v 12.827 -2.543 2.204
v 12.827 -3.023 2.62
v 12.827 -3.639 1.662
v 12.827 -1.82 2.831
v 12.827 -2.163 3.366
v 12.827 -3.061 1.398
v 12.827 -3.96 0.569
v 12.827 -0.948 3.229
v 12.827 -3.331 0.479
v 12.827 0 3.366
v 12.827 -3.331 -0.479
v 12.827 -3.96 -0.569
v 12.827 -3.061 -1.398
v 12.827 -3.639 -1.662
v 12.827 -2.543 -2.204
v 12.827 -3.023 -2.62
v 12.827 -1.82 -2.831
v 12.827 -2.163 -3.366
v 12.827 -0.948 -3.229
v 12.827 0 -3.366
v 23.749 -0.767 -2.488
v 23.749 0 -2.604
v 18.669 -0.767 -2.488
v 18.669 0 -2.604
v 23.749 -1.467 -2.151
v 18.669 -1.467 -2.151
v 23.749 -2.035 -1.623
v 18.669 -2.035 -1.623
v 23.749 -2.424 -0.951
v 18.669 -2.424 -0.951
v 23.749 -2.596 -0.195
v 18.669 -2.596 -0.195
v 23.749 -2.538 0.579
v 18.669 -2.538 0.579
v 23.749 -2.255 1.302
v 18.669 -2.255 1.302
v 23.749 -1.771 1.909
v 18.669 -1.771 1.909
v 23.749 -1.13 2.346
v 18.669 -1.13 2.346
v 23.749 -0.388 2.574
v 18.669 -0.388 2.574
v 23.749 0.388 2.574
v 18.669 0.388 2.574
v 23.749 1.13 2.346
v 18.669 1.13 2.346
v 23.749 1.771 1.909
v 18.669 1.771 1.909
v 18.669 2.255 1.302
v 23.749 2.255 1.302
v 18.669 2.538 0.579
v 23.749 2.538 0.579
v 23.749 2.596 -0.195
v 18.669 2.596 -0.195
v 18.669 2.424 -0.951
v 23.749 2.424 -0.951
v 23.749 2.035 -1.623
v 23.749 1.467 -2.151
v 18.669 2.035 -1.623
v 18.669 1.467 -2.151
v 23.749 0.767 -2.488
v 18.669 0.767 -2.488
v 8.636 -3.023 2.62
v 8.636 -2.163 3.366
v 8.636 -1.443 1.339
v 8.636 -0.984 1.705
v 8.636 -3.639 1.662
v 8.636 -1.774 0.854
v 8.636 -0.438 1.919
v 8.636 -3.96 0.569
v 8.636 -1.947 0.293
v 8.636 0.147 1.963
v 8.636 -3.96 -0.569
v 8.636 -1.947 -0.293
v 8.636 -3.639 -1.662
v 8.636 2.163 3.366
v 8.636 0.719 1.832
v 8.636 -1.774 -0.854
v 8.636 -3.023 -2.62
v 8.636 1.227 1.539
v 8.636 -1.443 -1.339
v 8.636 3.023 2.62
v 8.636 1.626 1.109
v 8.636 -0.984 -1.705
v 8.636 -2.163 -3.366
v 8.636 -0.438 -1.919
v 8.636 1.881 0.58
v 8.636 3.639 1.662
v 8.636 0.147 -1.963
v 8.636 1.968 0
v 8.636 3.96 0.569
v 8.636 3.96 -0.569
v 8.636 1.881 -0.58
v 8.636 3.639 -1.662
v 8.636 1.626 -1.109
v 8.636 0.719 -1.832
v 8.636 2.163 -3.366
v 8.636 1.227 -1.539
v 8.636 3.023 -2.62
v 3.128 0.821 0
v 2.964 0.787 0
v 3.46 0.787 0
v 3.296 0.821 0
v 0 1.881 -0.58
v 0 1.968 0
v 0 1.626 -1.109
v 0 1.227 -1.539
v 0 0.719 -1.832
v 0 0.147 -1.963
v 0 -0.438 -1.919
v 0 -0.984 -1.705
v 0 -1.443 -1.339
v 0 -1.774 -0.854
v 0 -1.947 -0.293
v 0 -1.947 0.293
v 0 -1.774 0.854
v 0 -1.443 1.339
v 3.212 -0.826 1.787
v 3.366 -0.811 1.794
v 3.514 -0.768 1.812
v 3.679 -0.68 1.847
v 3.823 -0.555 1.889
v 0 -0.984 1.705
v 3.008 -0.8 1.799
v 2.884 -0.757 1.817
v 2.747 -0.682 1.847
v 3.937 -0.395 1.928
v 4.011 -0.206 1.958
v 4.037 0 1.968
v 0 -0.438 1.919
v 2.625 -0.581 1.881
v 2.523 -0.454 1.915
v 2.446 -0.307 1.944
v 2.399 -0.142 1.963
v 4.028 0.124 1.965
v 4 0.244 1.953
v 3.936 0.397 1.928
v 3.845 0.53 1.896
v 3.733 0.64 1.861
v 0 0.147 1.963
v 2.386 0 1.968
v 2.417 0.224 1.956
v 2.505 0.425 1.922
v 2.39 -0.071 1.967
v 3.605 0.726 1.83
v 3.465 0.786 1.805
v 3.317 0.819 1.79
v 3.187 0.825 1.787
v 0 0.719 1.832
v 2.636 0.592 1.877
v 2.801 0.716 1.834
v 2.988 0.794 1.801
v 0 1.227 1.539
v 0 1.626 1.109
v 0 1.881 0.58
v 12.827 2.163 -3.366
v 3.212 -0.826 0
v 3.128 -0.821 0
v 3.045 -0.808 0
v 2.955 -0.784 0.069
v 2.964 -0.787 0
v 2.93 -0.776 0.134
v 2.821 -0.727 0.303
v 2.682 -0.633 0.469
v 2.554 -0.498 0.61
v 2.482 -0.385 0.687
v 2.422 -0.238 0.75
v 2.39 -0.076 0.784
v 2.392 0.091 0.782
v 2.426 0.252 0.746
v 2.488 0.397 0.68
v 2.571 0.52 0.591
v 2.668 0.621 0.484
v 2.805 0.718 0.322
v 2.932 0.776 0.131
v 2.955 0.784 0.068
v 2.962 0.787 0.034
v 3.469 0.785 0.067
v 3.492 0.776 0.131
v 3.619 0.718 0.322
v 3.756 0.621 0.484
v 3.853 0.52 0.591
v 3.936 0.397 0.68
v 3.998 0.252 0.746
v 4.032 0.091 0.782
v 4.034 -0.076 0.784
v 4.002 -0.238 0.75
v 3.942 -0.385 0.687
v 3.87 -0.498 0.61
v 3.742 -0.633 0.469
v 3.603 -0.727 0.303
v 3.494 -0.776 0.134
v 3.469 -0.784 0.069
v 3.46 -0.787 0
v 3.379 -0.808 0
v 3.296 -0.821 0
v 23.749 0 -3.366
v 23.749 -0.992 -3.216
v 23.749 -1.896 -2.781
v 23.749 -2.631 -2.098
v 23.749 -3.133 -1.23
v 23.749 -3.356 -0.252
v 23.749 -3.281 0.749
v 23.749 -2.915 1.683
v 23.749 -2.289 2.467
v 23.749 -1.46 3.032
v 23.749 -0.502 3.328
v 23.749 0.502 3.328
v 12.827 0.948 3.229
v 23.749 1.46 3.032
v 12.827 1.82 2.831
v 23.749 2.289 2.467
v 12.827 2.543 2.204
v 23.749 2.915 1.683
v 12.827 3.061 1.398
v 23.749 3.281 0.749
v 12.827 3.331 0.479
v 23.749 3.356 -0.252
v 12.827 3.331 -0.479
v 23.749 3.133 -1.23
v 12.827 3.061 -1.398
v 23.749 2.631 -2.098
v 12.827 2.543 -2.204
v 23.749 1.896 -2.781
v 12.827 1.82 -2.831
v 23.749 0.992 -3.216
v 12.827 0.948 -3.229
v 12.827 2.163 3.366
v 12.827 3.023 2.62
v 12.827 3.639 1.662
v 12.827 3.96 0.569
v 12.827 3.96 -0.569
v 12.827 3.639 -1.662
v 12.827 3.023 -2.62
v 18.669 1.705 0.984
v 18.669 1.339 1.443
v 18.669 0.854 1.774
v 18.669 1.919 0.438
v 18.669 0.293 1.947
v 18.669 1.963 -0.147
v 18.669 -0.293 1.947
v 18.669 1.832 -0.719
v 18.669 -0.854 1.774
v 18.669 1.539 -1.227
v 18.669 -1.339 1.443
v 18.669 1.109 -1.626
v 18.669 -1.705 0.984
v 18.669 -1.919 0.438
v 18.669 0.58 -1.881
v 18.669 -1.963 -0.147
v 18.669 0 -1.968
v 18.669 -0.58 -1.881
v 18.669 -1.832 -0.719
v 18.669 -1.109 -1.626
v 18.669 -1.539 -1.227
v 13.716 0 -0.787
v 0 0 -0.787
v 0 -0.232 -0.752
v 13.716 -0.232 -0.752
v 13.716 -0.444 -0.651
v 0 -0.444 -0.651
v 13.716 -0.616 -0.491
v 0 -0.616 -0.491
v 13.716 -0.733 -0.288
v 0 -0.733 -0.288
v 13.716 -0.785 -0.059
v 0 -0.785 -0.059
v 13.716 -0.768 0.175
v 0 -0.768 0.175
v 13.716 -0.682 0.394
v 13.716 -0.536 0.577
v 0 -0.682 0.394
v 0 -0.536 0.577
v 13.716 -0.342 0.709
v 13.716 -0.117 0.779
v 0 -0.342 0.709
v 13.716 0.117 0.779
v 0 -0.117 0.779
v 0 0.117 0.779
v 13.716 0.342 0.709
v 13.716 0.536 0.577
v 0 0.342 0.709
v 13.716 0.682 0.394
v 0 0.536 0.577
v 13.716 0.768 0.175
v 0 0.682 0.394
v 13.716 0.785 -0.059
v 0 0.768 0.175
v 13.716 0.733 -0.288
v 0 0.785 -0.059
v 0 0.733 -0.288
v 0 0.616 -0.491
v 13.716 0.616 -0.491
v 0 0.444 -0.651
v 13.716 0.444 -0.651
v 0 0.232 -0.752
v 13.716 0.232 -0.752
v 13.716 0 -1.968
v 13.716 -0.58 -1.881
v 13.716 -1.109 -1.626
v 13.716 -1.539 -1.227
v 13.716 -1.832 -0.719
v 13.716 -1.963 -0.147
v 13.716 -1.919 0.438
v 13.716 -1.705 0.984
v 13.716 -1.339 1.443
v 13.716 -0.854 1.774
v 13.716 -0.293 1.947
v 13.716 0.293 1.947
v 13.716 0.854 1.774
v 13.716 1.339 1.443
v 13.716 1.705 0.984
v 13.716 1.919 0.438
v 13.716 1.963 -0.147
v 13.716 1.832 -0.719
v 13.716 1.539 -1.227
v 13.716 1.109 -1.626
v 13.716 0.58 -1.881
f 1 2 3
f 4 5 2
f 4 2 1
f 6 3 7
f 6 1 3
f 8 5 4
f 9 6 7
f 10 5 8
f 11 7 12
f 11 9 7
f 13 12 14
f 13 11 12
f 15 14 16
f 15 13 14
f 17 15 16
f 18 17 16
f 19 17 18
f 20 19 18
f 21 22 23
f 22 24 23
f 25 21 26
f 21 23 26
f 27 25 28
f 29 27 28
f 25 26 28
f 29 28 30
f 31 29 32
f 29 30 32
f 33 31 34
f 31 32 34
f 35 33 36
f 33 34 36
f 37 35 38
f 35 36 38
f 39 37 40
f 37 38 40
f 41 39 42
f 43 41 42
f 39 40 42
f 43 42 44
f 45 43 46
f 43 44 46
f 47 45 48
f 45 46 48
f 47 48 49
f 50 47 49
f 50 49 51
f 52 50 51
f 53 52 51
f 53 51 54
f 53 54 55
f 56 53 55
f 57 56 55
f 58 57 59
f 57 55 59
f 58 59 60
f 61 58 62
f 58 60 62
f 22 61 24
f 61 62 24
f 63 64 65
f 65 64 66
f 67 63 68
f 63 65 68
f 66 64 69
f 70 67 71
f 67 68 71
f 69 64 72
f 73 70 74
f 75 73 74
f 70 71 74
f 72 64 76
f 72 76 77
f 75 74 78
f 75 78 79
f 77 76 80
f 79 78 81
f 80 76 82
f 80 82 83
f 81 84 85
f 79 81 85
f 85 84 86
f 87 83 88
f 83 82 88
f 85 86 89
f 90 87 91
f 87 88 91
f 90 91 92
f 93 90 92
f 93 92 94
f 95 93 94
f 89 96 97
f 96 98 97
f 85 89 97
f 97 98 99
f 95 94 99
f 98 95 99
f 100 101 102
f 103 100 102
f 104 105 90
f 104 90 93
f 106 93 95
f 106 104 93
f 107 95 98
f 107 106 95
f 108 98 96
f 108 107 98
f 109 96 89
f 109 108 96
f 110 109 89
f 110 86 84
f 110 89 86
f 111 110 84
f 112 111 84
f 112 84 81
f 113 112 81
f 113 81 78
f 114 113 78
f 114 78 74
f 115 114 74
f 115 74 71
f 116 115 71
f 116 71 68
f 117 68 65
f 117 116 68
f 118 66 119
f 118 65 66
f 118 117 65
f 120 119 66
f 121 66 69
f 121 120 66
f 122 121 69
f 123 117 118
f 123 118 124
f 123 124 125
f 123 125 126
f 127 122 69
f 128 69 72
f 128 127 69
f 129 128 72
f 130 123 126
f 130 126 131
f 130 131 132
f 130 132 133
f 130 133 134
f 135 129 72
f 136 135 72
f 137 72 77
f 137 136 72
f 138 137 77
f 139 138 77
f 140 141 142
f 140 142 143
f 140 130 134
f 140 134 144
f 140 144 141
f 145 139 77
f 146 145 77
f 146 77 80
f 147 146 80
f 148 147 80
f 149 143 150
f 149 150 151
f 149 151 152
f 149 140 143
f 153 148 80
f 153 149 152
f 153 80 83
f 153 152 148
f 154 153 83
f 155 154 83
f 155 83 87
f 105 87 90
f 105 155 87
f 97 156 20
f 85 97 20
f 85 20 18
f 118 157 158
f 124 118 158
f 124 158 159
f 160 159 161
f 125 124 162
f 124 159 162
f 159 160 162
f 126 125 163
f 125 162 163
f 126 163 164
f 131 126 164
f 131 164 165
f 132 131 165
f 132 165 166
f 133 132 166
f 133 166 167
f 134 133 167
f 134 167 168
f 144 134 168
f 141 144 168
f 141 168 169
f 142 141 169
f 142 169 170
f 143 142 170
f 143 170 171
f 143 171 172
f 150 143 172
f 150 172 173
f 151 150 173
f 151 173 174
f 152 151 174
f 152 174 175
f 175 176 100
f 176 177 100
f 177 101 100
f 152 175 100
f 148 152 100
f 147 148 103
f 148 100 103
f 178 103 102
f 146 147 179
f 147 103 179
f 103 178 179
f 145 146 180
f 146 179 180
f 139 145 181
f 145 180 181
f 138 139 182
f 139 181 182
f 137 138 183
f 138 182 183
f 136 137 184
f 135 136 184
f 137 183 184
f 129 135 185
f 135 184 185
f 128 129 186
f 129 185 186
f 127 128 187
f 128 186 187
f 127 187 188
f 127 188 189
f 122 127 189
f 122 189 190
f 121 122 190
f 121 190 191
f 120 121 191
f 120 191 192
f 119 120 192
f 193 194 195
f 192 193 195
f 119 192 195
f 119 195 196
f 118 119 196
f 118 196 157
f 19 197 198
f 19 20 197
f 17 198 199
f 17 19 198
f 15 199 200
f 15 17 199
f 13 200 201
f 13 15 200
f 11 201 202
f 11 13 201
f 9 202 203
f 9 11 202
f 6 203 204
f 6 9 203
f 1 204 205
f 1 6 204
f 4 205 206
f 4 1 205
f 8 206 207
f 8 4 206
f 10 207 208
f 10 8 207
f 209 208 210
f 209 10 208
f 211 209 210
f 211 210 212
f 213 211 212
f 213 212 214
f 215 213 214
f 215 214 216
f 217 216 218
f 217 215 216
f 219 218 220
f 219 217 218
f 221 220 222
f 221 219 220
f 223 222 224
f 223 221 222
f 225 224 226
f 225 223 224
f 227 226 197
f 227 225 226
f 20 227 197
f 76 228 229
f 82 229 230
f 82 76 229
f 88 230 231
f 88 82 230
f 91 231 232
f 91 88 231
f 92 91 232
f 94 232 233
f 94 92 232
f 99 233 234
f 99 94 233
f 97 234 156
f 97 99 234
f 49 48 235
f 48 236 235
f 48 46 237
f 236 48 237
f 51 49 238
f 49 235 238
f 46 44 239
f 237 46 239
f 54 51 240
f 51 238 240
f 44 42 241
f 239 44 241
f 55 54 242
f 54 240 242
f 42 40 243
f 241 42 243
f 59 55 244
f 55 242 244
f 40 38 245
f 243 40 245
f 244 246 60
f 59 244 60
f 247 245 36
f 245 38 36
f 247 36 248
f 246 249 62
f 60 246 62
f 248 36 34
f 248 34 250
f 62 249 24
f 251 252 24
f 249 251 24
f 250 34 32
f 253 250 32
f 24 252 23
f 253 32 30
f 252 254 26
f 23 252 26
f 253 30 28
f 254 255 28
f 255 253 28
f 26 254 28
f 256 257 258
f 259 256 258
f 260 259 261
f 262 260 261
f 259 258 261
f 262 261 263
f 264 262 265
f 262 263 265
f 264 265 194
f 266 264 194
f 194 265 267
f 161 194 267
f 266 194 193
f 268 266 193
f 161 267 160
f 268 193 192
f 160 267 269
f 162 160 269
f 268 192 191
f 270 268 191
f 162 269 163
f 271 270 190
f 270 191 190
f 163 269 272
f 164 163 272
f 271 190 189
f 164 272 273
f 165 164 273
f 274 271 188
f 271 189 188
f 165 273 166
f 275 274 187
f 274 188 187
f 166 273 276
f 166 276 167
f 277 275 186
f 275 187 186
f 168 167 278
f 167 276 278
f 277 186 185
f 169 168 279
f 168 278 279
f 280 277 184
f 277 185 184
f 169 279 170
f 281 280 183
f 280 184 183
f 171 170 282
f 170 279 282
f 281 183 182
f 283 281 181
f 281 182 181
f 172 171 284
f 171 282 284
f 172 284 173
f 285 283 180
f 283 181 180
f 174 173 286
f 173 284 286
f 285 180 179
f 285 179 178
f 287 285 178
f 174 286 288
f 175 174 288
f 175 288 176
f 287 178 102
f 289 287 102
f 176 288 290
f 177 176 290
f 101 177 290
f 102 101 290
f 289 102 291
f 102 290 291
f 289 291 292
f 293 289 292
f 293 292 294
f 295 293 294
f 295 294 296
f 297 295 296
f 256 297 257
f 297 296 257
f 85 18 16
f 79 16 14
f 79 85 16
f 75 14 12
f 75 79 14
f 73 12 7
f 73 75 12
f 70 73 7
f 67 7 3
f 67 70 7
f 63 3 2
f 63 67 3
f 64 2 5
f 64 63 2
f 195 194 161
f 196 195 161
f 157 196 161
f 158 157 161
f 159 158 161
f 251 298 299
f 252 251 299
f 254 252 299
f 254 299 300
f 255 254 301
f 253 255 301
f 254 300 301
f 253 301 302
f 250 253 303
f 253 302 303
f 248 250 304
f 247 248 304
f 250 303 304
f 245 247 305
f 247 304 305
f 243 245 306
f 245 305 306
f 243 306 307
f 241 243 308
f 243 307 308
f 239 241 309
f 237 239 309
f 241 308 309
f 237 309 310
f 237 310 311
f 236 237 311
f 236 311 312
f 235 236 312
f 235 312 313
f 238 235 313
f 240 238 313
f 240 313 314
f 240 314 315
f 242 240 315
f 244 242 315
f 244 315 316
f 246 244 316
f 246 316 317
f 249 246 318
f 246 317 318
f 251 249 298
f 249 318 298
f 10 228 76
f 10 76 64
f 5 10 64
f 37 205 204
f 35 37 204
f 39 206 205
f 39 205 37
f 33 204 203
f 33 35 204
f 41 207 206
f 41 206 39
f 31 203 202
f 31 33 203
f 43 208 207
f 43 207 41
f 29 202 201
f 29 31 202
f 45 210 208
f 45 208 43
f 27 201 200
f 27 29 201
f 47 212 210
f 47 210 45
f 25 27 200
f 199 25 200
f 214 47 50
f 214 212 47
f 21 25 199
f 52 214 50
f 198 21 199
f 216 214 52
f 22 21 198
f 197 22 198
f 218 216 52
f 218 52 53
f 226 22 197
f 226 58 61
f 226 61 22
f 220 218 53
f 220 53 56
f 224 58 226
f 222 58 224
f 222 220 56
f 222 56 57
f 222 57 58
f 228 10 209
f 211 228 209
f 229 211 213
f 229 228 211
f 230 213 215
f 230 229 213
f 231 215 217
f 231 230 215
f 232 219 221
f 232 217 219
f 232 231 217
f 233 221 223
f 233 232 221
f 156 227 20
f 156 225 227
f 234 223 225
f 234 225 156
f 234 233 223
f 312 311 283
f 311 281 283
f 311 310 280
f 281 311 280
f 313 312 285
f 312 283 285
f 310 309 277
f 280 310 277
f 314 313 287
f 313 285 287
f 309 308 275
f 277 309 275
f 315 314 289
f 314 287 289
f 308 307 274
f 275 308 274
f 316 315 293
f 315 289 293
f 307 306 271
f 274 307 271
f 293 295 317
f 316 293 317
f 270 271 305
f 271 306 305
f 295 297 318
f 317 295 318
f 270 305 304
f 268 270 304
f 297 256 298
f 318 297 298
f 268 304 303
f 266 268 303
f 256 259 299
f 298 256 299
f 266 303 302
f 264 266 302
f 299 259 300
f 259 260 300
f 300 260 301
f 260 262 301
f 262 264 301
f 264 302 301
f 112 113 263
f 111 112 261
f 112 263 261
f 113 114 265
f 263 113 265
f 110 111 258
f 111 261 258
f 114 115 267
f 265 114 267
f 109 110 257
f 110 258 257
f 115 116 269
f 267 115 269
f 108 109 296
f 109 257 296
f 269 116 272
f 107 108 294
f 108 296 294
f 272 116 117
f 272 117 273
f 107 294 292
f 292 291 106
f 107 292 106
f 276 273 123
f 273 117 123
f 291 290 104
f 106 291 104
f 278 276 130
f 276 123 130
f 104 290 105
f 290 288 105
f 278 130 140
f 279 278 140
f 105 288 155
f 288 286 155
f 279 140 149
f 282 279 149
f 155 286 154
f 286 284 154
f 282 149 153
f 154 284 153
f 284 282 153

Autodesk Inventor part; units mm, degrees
ref_plane "YZ Plane" through (0, 0, 0) normal (1, 0, 0) x (0, 1, 0)
ref_plane "XZ Plane" through (0, 0, 0) normal (0, 1, 0) x (-1, 0, 0)
ref_plane "XY Plane" through (0, 0, 0) normal (0, 0, 1) x (1, 0, 0)
sketch "Sketch1" plane through (0, 0, 0) normal (1, 0, 0) x (0, 1, 0)
  circle A0 centre (0, 0) radius 1.9685
  dimension "d0" = 3.937
extrude "Extrusion1" add sketch "Sketch1" along normal blind 8.636
sketch "Sketch2" plane through (8.636, 0, 0) normal (1, 0, 0) x (0, 0, -1)
  circle A0 centre (0, 0) radius 1.9685 projected
  circle A1 centre (0, 0) radius 4.0005
  dimension "d3" = 8.001
extrude "Extrusion2" add sketch "Sketch2" along normal blind 4.191 contours A0 | A1
sketch "Sketch3" plane through (12.827, 0, 0) normal (1, 0, 0) x (0, 0, -1)
  circle A0 centre (0, 0) radius 4.0005 projected
  circle A1 centre (0, 0) radius 3.3655
  dimension "d6" = 6.731
extrude "Extrusion3" add sketch "Sketch3" along normal blind 10.922 contours A1
sketch "Sketch4" plane through (12.827, 0, 0) normal (1, 0, 0) x (0, 0, -1)
  circle A0 centre (0, 0) radius 3.3655 projected
  circle A1 centre (0, 0) radius 4.0005 projected
  line L0 (-3.3655, 2.1627) -> (-3.3655, -2.1627)
  line L1 (3.3655, 2.1627) -> (3.3655, -2.1627)
extrude "Extrusion4" cut sketch "Sketch4" against normal through all contours L1 A1 | L0 A1
sketch "Sketch5" plane through (23.749, 0, 0) normal (1, 0, 0) x (0, 0, -1)
  circle A0 centre (0, 0) radius 3.3655 projected
hole "Hole1" at (23.749, 0, 0) direction (-1, 0, 0) diameter 5.207 depth 5.08
sketch "Sketch6" plane through (18.669, 0, 0) normal (1, 0, 0) x (0, 0, -1)
  circle A0 centre (0, 0) radius 2.6035 projected
hole "Hole2" at (18.669, 0, 0) direction (-1, 0, 0) diameter 3.937 depth 4.953
sketch "Sketch7" plane through (13.716, 0, 0) normal (1, 0, 0) x (0, 0, -1)
  circle A0 centre (0, 0) radius 1.9685 projected
hole "Hole3" at (13.716, 0, 0) direction (-1, 0, 0) diameter 1.5748 end through all
ref_plane "Work Plane1" through (0, 0, 1.9685) normal (0, 0, 1) x (1, 0, 0)
sketch "Sketch8" plane through (0, 0, 1.9685) normal (0, 0, 1) x (1, 0, 0)
  line L0 (0, 0) -> (3.212, 0)
hole "Hole4" at (3.212, 0, 1.9685) direction (0, 0, -1) diameter 1.651 depth 1.9685
thread "Thread1" size "8-32 UNC" class "2B" standard "ANSI Unified Screw Threads" full length
thread "Thread2" size "8-32 UNC" class "2A" standard "ANSI Unified Screw Threads" length 7.62 offset 2.54
properties part number "Fuel Adjuster"
